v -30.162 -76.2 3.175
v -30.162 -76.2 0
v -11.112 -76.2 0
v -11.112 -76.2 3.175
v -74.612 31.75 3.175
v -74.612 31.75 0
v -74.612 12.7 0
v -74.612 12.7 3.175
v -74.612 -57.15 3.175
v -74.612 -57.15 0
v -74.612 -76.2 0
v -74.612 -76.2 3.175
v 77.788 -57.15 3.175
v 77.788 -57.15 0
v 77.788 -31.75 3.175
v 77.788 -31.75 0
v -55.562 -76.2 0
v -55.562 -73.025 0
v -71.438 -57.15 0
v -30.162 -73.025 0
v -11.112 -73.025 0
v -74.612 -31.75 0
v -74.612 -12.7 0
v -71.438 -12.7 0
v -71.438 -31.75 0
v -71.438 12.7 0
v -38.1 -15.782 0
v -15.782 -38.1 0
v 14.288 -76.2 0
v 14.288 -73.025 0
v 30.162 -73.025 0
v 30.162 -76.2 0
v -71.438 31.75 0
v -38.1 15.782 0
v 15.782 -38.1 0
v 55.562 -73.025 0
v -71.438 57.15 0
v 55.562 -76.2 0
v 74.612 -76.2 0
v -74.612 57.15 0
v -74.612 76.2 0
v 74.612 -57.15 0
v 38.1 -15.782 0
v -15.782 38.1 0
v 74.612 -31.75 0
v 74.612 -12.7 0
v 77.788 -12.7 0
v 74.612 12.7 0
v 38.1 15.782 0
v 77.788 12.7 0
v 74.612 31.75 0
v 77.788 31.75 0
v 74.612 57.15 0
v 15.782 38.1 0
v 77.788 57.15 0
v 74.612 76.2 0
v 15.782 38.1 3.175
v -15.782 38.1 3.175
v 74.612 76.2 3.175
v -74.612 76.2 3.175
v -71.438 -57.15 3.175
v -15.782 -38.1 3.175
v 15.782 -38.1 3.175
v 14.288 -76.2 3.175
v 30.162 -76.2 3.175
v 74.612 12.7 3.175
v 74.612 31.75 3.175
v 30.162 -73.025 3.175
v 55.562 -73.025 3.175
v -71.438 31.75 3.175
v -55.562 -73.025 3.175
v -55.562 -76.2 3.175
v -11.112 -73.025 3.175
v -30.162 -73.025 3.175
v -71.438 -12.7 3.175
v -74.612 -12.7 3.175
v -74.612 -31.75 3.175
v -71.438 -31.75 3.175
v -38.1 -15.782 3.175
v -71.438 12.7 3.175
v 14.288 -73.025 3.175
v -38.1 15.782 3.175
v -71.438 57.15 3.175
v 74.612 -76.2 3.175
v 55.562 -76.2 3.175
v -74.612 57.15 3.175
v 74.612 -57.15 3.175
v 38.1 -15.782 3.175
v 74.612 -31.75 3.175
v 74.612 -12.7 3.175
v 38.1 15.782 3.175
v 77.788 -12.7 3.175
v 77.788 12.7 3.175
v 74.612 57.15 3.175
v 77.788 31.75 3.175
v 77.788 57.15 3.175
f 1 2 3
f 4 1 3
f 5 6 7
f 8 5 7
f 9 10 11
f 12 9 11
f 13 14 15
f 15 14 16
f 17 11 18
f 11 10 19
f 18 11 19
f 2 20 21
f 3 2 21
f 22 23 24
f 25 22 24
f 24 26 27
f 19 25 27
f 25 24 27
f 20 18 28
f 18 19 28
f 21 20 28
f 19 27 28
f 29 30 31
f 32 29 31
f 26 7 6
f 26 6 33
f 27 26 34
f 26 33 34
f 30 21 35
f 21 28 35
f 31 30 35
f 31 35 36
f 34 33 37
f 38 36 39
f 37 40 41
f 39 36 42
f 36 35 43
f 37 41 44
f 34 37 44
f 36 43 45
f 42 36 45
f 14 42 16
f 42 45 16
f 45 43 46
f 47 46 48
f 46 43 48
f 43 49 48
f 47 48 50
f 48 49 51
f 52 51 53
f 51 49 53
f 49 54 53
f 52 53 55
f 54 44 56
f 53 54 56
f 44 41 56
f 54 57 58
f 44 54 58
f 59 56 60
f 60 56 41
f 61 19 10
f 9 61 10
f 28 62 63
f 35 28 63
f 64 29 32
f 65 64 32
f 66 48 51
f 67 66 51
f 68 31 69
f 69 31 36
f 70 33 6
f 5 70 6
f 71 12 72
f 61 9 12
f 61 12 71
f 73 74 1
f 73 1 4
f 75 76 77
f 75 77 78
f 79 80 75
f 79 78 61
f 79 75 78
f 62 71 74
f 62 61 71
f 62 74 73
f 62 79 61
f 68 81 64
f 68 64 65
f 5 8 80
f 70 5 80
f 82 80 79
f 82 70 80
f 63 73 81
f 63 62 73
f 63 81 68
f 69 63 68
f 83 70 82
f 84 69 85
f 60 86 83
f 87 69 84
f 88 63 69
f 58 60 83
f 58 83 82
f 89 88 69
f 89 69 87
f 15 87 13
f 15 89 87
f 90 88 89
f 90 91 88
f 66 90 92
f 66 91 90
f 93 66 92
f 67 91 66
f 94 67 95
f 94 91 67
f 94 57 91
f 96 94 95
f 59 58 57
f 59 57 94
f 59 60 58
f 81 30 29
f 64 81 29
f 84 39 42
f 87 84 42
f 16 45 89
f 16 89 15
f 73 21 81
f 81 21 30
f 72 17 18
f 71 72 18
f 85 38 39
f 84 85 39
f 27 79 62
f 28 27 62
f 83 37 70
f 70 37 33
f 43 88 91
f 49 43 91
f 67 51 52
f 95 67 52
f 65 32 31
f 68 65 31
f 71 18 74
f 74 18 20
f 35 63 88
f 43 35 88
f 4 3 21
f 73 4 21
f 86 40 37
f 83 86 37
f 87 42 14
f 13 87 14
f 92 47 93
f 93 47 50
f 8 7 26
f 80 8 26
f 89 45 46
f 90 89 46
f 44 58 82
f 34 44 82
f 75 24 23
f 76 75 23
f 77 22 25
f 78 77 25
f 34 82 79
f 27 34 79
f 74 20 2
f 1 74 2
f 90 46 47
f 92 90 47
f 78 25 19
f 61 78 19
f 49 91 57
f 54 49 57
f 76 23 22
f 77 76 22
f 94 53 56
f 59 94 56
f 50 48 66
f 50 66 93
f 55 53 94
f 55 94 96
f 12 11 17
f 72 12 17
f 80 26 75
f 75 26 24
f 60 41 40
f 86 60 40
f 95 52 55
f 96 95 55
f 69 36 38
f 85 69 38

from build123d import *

# Parameters (mm, degrees)
SKETCH1_W           = 3.175
SKETCH1_H           = 25.4
BOSS_EXTRUDE1_DEPTH = 3.175
CUT_EXTRUDE1_DEPTH  = 4.175


with BuildPart() as part:
    # Sketch1 → Boss-Extrude1 (new body)
    with BuildSketch(Plane.XY):
        Polygon((55.5625, -76.2), (74.6125, -76.2), (74.6125, -57.15), (74.6125, -31.75), (74.6125, -12.7), (74.6125, 12.7), (74.6125, 31.75), (74.6125, 57.15), (74.6125, 76.2), (-74.6125, 76.2), (-74.6125, 57.15), (-71.4375, 57.15), (-71.4375, 31.75), (-74.6125, 31.75), (-74.6125, 12.7), (-71.4375, 12.7), (-71.4375, -12.7), (-74.6125, -12.7), (-74.6125, -31.75), (-71.4375, -31.75), (-71.4375, -57.15), (-74.6125, -57.15), (-74.6125, -76.2), (-55.5625, -76.2), (-55.5625, -73.025), (-30.1625, -73.025), (-30.1625, -76.2), (-11.1125, -76.2), (-11.1125, -73.025), (14.2875, -73.025), (14.2875, -76.2), (30.1625, -76.2), (30.1625, -73.025), (55.5625, -73.025), align=None)
        with Locations((76.2, 44.45)):
            Rectangle(SKETCH1_W, SKETCH1_H)
        with Locations((76.2, 0)):
            Rectangle(SKETCH1_W, SKETCH1_H)
        with Locations((76.2, -44.45)):
            Rectangle(SKETCH1_W, SKETCH1_H)
    extrude(amount=BOSS_EXTRUDE1_DEPTH)

    # Sketch2 → Cut-Extrude1 (cut, through all)
    with BuildSketch(Plane.XY.offset(3.175)):
        Polygon((-15.781536726, 38.1), (-38.1, 15.781536726), (-38.1, -15.781536726), (-15.781536726, -38.1), (15.781536726, -38.1), (38.1, -15.781536726), (38.1, 15.781536726), (15.781536726, 38.1), align=None)
    extrude(amount=-CUT_EXTRUDE1_DEPTH, mode=Mode.SUBTRACT)


solid = part.part
